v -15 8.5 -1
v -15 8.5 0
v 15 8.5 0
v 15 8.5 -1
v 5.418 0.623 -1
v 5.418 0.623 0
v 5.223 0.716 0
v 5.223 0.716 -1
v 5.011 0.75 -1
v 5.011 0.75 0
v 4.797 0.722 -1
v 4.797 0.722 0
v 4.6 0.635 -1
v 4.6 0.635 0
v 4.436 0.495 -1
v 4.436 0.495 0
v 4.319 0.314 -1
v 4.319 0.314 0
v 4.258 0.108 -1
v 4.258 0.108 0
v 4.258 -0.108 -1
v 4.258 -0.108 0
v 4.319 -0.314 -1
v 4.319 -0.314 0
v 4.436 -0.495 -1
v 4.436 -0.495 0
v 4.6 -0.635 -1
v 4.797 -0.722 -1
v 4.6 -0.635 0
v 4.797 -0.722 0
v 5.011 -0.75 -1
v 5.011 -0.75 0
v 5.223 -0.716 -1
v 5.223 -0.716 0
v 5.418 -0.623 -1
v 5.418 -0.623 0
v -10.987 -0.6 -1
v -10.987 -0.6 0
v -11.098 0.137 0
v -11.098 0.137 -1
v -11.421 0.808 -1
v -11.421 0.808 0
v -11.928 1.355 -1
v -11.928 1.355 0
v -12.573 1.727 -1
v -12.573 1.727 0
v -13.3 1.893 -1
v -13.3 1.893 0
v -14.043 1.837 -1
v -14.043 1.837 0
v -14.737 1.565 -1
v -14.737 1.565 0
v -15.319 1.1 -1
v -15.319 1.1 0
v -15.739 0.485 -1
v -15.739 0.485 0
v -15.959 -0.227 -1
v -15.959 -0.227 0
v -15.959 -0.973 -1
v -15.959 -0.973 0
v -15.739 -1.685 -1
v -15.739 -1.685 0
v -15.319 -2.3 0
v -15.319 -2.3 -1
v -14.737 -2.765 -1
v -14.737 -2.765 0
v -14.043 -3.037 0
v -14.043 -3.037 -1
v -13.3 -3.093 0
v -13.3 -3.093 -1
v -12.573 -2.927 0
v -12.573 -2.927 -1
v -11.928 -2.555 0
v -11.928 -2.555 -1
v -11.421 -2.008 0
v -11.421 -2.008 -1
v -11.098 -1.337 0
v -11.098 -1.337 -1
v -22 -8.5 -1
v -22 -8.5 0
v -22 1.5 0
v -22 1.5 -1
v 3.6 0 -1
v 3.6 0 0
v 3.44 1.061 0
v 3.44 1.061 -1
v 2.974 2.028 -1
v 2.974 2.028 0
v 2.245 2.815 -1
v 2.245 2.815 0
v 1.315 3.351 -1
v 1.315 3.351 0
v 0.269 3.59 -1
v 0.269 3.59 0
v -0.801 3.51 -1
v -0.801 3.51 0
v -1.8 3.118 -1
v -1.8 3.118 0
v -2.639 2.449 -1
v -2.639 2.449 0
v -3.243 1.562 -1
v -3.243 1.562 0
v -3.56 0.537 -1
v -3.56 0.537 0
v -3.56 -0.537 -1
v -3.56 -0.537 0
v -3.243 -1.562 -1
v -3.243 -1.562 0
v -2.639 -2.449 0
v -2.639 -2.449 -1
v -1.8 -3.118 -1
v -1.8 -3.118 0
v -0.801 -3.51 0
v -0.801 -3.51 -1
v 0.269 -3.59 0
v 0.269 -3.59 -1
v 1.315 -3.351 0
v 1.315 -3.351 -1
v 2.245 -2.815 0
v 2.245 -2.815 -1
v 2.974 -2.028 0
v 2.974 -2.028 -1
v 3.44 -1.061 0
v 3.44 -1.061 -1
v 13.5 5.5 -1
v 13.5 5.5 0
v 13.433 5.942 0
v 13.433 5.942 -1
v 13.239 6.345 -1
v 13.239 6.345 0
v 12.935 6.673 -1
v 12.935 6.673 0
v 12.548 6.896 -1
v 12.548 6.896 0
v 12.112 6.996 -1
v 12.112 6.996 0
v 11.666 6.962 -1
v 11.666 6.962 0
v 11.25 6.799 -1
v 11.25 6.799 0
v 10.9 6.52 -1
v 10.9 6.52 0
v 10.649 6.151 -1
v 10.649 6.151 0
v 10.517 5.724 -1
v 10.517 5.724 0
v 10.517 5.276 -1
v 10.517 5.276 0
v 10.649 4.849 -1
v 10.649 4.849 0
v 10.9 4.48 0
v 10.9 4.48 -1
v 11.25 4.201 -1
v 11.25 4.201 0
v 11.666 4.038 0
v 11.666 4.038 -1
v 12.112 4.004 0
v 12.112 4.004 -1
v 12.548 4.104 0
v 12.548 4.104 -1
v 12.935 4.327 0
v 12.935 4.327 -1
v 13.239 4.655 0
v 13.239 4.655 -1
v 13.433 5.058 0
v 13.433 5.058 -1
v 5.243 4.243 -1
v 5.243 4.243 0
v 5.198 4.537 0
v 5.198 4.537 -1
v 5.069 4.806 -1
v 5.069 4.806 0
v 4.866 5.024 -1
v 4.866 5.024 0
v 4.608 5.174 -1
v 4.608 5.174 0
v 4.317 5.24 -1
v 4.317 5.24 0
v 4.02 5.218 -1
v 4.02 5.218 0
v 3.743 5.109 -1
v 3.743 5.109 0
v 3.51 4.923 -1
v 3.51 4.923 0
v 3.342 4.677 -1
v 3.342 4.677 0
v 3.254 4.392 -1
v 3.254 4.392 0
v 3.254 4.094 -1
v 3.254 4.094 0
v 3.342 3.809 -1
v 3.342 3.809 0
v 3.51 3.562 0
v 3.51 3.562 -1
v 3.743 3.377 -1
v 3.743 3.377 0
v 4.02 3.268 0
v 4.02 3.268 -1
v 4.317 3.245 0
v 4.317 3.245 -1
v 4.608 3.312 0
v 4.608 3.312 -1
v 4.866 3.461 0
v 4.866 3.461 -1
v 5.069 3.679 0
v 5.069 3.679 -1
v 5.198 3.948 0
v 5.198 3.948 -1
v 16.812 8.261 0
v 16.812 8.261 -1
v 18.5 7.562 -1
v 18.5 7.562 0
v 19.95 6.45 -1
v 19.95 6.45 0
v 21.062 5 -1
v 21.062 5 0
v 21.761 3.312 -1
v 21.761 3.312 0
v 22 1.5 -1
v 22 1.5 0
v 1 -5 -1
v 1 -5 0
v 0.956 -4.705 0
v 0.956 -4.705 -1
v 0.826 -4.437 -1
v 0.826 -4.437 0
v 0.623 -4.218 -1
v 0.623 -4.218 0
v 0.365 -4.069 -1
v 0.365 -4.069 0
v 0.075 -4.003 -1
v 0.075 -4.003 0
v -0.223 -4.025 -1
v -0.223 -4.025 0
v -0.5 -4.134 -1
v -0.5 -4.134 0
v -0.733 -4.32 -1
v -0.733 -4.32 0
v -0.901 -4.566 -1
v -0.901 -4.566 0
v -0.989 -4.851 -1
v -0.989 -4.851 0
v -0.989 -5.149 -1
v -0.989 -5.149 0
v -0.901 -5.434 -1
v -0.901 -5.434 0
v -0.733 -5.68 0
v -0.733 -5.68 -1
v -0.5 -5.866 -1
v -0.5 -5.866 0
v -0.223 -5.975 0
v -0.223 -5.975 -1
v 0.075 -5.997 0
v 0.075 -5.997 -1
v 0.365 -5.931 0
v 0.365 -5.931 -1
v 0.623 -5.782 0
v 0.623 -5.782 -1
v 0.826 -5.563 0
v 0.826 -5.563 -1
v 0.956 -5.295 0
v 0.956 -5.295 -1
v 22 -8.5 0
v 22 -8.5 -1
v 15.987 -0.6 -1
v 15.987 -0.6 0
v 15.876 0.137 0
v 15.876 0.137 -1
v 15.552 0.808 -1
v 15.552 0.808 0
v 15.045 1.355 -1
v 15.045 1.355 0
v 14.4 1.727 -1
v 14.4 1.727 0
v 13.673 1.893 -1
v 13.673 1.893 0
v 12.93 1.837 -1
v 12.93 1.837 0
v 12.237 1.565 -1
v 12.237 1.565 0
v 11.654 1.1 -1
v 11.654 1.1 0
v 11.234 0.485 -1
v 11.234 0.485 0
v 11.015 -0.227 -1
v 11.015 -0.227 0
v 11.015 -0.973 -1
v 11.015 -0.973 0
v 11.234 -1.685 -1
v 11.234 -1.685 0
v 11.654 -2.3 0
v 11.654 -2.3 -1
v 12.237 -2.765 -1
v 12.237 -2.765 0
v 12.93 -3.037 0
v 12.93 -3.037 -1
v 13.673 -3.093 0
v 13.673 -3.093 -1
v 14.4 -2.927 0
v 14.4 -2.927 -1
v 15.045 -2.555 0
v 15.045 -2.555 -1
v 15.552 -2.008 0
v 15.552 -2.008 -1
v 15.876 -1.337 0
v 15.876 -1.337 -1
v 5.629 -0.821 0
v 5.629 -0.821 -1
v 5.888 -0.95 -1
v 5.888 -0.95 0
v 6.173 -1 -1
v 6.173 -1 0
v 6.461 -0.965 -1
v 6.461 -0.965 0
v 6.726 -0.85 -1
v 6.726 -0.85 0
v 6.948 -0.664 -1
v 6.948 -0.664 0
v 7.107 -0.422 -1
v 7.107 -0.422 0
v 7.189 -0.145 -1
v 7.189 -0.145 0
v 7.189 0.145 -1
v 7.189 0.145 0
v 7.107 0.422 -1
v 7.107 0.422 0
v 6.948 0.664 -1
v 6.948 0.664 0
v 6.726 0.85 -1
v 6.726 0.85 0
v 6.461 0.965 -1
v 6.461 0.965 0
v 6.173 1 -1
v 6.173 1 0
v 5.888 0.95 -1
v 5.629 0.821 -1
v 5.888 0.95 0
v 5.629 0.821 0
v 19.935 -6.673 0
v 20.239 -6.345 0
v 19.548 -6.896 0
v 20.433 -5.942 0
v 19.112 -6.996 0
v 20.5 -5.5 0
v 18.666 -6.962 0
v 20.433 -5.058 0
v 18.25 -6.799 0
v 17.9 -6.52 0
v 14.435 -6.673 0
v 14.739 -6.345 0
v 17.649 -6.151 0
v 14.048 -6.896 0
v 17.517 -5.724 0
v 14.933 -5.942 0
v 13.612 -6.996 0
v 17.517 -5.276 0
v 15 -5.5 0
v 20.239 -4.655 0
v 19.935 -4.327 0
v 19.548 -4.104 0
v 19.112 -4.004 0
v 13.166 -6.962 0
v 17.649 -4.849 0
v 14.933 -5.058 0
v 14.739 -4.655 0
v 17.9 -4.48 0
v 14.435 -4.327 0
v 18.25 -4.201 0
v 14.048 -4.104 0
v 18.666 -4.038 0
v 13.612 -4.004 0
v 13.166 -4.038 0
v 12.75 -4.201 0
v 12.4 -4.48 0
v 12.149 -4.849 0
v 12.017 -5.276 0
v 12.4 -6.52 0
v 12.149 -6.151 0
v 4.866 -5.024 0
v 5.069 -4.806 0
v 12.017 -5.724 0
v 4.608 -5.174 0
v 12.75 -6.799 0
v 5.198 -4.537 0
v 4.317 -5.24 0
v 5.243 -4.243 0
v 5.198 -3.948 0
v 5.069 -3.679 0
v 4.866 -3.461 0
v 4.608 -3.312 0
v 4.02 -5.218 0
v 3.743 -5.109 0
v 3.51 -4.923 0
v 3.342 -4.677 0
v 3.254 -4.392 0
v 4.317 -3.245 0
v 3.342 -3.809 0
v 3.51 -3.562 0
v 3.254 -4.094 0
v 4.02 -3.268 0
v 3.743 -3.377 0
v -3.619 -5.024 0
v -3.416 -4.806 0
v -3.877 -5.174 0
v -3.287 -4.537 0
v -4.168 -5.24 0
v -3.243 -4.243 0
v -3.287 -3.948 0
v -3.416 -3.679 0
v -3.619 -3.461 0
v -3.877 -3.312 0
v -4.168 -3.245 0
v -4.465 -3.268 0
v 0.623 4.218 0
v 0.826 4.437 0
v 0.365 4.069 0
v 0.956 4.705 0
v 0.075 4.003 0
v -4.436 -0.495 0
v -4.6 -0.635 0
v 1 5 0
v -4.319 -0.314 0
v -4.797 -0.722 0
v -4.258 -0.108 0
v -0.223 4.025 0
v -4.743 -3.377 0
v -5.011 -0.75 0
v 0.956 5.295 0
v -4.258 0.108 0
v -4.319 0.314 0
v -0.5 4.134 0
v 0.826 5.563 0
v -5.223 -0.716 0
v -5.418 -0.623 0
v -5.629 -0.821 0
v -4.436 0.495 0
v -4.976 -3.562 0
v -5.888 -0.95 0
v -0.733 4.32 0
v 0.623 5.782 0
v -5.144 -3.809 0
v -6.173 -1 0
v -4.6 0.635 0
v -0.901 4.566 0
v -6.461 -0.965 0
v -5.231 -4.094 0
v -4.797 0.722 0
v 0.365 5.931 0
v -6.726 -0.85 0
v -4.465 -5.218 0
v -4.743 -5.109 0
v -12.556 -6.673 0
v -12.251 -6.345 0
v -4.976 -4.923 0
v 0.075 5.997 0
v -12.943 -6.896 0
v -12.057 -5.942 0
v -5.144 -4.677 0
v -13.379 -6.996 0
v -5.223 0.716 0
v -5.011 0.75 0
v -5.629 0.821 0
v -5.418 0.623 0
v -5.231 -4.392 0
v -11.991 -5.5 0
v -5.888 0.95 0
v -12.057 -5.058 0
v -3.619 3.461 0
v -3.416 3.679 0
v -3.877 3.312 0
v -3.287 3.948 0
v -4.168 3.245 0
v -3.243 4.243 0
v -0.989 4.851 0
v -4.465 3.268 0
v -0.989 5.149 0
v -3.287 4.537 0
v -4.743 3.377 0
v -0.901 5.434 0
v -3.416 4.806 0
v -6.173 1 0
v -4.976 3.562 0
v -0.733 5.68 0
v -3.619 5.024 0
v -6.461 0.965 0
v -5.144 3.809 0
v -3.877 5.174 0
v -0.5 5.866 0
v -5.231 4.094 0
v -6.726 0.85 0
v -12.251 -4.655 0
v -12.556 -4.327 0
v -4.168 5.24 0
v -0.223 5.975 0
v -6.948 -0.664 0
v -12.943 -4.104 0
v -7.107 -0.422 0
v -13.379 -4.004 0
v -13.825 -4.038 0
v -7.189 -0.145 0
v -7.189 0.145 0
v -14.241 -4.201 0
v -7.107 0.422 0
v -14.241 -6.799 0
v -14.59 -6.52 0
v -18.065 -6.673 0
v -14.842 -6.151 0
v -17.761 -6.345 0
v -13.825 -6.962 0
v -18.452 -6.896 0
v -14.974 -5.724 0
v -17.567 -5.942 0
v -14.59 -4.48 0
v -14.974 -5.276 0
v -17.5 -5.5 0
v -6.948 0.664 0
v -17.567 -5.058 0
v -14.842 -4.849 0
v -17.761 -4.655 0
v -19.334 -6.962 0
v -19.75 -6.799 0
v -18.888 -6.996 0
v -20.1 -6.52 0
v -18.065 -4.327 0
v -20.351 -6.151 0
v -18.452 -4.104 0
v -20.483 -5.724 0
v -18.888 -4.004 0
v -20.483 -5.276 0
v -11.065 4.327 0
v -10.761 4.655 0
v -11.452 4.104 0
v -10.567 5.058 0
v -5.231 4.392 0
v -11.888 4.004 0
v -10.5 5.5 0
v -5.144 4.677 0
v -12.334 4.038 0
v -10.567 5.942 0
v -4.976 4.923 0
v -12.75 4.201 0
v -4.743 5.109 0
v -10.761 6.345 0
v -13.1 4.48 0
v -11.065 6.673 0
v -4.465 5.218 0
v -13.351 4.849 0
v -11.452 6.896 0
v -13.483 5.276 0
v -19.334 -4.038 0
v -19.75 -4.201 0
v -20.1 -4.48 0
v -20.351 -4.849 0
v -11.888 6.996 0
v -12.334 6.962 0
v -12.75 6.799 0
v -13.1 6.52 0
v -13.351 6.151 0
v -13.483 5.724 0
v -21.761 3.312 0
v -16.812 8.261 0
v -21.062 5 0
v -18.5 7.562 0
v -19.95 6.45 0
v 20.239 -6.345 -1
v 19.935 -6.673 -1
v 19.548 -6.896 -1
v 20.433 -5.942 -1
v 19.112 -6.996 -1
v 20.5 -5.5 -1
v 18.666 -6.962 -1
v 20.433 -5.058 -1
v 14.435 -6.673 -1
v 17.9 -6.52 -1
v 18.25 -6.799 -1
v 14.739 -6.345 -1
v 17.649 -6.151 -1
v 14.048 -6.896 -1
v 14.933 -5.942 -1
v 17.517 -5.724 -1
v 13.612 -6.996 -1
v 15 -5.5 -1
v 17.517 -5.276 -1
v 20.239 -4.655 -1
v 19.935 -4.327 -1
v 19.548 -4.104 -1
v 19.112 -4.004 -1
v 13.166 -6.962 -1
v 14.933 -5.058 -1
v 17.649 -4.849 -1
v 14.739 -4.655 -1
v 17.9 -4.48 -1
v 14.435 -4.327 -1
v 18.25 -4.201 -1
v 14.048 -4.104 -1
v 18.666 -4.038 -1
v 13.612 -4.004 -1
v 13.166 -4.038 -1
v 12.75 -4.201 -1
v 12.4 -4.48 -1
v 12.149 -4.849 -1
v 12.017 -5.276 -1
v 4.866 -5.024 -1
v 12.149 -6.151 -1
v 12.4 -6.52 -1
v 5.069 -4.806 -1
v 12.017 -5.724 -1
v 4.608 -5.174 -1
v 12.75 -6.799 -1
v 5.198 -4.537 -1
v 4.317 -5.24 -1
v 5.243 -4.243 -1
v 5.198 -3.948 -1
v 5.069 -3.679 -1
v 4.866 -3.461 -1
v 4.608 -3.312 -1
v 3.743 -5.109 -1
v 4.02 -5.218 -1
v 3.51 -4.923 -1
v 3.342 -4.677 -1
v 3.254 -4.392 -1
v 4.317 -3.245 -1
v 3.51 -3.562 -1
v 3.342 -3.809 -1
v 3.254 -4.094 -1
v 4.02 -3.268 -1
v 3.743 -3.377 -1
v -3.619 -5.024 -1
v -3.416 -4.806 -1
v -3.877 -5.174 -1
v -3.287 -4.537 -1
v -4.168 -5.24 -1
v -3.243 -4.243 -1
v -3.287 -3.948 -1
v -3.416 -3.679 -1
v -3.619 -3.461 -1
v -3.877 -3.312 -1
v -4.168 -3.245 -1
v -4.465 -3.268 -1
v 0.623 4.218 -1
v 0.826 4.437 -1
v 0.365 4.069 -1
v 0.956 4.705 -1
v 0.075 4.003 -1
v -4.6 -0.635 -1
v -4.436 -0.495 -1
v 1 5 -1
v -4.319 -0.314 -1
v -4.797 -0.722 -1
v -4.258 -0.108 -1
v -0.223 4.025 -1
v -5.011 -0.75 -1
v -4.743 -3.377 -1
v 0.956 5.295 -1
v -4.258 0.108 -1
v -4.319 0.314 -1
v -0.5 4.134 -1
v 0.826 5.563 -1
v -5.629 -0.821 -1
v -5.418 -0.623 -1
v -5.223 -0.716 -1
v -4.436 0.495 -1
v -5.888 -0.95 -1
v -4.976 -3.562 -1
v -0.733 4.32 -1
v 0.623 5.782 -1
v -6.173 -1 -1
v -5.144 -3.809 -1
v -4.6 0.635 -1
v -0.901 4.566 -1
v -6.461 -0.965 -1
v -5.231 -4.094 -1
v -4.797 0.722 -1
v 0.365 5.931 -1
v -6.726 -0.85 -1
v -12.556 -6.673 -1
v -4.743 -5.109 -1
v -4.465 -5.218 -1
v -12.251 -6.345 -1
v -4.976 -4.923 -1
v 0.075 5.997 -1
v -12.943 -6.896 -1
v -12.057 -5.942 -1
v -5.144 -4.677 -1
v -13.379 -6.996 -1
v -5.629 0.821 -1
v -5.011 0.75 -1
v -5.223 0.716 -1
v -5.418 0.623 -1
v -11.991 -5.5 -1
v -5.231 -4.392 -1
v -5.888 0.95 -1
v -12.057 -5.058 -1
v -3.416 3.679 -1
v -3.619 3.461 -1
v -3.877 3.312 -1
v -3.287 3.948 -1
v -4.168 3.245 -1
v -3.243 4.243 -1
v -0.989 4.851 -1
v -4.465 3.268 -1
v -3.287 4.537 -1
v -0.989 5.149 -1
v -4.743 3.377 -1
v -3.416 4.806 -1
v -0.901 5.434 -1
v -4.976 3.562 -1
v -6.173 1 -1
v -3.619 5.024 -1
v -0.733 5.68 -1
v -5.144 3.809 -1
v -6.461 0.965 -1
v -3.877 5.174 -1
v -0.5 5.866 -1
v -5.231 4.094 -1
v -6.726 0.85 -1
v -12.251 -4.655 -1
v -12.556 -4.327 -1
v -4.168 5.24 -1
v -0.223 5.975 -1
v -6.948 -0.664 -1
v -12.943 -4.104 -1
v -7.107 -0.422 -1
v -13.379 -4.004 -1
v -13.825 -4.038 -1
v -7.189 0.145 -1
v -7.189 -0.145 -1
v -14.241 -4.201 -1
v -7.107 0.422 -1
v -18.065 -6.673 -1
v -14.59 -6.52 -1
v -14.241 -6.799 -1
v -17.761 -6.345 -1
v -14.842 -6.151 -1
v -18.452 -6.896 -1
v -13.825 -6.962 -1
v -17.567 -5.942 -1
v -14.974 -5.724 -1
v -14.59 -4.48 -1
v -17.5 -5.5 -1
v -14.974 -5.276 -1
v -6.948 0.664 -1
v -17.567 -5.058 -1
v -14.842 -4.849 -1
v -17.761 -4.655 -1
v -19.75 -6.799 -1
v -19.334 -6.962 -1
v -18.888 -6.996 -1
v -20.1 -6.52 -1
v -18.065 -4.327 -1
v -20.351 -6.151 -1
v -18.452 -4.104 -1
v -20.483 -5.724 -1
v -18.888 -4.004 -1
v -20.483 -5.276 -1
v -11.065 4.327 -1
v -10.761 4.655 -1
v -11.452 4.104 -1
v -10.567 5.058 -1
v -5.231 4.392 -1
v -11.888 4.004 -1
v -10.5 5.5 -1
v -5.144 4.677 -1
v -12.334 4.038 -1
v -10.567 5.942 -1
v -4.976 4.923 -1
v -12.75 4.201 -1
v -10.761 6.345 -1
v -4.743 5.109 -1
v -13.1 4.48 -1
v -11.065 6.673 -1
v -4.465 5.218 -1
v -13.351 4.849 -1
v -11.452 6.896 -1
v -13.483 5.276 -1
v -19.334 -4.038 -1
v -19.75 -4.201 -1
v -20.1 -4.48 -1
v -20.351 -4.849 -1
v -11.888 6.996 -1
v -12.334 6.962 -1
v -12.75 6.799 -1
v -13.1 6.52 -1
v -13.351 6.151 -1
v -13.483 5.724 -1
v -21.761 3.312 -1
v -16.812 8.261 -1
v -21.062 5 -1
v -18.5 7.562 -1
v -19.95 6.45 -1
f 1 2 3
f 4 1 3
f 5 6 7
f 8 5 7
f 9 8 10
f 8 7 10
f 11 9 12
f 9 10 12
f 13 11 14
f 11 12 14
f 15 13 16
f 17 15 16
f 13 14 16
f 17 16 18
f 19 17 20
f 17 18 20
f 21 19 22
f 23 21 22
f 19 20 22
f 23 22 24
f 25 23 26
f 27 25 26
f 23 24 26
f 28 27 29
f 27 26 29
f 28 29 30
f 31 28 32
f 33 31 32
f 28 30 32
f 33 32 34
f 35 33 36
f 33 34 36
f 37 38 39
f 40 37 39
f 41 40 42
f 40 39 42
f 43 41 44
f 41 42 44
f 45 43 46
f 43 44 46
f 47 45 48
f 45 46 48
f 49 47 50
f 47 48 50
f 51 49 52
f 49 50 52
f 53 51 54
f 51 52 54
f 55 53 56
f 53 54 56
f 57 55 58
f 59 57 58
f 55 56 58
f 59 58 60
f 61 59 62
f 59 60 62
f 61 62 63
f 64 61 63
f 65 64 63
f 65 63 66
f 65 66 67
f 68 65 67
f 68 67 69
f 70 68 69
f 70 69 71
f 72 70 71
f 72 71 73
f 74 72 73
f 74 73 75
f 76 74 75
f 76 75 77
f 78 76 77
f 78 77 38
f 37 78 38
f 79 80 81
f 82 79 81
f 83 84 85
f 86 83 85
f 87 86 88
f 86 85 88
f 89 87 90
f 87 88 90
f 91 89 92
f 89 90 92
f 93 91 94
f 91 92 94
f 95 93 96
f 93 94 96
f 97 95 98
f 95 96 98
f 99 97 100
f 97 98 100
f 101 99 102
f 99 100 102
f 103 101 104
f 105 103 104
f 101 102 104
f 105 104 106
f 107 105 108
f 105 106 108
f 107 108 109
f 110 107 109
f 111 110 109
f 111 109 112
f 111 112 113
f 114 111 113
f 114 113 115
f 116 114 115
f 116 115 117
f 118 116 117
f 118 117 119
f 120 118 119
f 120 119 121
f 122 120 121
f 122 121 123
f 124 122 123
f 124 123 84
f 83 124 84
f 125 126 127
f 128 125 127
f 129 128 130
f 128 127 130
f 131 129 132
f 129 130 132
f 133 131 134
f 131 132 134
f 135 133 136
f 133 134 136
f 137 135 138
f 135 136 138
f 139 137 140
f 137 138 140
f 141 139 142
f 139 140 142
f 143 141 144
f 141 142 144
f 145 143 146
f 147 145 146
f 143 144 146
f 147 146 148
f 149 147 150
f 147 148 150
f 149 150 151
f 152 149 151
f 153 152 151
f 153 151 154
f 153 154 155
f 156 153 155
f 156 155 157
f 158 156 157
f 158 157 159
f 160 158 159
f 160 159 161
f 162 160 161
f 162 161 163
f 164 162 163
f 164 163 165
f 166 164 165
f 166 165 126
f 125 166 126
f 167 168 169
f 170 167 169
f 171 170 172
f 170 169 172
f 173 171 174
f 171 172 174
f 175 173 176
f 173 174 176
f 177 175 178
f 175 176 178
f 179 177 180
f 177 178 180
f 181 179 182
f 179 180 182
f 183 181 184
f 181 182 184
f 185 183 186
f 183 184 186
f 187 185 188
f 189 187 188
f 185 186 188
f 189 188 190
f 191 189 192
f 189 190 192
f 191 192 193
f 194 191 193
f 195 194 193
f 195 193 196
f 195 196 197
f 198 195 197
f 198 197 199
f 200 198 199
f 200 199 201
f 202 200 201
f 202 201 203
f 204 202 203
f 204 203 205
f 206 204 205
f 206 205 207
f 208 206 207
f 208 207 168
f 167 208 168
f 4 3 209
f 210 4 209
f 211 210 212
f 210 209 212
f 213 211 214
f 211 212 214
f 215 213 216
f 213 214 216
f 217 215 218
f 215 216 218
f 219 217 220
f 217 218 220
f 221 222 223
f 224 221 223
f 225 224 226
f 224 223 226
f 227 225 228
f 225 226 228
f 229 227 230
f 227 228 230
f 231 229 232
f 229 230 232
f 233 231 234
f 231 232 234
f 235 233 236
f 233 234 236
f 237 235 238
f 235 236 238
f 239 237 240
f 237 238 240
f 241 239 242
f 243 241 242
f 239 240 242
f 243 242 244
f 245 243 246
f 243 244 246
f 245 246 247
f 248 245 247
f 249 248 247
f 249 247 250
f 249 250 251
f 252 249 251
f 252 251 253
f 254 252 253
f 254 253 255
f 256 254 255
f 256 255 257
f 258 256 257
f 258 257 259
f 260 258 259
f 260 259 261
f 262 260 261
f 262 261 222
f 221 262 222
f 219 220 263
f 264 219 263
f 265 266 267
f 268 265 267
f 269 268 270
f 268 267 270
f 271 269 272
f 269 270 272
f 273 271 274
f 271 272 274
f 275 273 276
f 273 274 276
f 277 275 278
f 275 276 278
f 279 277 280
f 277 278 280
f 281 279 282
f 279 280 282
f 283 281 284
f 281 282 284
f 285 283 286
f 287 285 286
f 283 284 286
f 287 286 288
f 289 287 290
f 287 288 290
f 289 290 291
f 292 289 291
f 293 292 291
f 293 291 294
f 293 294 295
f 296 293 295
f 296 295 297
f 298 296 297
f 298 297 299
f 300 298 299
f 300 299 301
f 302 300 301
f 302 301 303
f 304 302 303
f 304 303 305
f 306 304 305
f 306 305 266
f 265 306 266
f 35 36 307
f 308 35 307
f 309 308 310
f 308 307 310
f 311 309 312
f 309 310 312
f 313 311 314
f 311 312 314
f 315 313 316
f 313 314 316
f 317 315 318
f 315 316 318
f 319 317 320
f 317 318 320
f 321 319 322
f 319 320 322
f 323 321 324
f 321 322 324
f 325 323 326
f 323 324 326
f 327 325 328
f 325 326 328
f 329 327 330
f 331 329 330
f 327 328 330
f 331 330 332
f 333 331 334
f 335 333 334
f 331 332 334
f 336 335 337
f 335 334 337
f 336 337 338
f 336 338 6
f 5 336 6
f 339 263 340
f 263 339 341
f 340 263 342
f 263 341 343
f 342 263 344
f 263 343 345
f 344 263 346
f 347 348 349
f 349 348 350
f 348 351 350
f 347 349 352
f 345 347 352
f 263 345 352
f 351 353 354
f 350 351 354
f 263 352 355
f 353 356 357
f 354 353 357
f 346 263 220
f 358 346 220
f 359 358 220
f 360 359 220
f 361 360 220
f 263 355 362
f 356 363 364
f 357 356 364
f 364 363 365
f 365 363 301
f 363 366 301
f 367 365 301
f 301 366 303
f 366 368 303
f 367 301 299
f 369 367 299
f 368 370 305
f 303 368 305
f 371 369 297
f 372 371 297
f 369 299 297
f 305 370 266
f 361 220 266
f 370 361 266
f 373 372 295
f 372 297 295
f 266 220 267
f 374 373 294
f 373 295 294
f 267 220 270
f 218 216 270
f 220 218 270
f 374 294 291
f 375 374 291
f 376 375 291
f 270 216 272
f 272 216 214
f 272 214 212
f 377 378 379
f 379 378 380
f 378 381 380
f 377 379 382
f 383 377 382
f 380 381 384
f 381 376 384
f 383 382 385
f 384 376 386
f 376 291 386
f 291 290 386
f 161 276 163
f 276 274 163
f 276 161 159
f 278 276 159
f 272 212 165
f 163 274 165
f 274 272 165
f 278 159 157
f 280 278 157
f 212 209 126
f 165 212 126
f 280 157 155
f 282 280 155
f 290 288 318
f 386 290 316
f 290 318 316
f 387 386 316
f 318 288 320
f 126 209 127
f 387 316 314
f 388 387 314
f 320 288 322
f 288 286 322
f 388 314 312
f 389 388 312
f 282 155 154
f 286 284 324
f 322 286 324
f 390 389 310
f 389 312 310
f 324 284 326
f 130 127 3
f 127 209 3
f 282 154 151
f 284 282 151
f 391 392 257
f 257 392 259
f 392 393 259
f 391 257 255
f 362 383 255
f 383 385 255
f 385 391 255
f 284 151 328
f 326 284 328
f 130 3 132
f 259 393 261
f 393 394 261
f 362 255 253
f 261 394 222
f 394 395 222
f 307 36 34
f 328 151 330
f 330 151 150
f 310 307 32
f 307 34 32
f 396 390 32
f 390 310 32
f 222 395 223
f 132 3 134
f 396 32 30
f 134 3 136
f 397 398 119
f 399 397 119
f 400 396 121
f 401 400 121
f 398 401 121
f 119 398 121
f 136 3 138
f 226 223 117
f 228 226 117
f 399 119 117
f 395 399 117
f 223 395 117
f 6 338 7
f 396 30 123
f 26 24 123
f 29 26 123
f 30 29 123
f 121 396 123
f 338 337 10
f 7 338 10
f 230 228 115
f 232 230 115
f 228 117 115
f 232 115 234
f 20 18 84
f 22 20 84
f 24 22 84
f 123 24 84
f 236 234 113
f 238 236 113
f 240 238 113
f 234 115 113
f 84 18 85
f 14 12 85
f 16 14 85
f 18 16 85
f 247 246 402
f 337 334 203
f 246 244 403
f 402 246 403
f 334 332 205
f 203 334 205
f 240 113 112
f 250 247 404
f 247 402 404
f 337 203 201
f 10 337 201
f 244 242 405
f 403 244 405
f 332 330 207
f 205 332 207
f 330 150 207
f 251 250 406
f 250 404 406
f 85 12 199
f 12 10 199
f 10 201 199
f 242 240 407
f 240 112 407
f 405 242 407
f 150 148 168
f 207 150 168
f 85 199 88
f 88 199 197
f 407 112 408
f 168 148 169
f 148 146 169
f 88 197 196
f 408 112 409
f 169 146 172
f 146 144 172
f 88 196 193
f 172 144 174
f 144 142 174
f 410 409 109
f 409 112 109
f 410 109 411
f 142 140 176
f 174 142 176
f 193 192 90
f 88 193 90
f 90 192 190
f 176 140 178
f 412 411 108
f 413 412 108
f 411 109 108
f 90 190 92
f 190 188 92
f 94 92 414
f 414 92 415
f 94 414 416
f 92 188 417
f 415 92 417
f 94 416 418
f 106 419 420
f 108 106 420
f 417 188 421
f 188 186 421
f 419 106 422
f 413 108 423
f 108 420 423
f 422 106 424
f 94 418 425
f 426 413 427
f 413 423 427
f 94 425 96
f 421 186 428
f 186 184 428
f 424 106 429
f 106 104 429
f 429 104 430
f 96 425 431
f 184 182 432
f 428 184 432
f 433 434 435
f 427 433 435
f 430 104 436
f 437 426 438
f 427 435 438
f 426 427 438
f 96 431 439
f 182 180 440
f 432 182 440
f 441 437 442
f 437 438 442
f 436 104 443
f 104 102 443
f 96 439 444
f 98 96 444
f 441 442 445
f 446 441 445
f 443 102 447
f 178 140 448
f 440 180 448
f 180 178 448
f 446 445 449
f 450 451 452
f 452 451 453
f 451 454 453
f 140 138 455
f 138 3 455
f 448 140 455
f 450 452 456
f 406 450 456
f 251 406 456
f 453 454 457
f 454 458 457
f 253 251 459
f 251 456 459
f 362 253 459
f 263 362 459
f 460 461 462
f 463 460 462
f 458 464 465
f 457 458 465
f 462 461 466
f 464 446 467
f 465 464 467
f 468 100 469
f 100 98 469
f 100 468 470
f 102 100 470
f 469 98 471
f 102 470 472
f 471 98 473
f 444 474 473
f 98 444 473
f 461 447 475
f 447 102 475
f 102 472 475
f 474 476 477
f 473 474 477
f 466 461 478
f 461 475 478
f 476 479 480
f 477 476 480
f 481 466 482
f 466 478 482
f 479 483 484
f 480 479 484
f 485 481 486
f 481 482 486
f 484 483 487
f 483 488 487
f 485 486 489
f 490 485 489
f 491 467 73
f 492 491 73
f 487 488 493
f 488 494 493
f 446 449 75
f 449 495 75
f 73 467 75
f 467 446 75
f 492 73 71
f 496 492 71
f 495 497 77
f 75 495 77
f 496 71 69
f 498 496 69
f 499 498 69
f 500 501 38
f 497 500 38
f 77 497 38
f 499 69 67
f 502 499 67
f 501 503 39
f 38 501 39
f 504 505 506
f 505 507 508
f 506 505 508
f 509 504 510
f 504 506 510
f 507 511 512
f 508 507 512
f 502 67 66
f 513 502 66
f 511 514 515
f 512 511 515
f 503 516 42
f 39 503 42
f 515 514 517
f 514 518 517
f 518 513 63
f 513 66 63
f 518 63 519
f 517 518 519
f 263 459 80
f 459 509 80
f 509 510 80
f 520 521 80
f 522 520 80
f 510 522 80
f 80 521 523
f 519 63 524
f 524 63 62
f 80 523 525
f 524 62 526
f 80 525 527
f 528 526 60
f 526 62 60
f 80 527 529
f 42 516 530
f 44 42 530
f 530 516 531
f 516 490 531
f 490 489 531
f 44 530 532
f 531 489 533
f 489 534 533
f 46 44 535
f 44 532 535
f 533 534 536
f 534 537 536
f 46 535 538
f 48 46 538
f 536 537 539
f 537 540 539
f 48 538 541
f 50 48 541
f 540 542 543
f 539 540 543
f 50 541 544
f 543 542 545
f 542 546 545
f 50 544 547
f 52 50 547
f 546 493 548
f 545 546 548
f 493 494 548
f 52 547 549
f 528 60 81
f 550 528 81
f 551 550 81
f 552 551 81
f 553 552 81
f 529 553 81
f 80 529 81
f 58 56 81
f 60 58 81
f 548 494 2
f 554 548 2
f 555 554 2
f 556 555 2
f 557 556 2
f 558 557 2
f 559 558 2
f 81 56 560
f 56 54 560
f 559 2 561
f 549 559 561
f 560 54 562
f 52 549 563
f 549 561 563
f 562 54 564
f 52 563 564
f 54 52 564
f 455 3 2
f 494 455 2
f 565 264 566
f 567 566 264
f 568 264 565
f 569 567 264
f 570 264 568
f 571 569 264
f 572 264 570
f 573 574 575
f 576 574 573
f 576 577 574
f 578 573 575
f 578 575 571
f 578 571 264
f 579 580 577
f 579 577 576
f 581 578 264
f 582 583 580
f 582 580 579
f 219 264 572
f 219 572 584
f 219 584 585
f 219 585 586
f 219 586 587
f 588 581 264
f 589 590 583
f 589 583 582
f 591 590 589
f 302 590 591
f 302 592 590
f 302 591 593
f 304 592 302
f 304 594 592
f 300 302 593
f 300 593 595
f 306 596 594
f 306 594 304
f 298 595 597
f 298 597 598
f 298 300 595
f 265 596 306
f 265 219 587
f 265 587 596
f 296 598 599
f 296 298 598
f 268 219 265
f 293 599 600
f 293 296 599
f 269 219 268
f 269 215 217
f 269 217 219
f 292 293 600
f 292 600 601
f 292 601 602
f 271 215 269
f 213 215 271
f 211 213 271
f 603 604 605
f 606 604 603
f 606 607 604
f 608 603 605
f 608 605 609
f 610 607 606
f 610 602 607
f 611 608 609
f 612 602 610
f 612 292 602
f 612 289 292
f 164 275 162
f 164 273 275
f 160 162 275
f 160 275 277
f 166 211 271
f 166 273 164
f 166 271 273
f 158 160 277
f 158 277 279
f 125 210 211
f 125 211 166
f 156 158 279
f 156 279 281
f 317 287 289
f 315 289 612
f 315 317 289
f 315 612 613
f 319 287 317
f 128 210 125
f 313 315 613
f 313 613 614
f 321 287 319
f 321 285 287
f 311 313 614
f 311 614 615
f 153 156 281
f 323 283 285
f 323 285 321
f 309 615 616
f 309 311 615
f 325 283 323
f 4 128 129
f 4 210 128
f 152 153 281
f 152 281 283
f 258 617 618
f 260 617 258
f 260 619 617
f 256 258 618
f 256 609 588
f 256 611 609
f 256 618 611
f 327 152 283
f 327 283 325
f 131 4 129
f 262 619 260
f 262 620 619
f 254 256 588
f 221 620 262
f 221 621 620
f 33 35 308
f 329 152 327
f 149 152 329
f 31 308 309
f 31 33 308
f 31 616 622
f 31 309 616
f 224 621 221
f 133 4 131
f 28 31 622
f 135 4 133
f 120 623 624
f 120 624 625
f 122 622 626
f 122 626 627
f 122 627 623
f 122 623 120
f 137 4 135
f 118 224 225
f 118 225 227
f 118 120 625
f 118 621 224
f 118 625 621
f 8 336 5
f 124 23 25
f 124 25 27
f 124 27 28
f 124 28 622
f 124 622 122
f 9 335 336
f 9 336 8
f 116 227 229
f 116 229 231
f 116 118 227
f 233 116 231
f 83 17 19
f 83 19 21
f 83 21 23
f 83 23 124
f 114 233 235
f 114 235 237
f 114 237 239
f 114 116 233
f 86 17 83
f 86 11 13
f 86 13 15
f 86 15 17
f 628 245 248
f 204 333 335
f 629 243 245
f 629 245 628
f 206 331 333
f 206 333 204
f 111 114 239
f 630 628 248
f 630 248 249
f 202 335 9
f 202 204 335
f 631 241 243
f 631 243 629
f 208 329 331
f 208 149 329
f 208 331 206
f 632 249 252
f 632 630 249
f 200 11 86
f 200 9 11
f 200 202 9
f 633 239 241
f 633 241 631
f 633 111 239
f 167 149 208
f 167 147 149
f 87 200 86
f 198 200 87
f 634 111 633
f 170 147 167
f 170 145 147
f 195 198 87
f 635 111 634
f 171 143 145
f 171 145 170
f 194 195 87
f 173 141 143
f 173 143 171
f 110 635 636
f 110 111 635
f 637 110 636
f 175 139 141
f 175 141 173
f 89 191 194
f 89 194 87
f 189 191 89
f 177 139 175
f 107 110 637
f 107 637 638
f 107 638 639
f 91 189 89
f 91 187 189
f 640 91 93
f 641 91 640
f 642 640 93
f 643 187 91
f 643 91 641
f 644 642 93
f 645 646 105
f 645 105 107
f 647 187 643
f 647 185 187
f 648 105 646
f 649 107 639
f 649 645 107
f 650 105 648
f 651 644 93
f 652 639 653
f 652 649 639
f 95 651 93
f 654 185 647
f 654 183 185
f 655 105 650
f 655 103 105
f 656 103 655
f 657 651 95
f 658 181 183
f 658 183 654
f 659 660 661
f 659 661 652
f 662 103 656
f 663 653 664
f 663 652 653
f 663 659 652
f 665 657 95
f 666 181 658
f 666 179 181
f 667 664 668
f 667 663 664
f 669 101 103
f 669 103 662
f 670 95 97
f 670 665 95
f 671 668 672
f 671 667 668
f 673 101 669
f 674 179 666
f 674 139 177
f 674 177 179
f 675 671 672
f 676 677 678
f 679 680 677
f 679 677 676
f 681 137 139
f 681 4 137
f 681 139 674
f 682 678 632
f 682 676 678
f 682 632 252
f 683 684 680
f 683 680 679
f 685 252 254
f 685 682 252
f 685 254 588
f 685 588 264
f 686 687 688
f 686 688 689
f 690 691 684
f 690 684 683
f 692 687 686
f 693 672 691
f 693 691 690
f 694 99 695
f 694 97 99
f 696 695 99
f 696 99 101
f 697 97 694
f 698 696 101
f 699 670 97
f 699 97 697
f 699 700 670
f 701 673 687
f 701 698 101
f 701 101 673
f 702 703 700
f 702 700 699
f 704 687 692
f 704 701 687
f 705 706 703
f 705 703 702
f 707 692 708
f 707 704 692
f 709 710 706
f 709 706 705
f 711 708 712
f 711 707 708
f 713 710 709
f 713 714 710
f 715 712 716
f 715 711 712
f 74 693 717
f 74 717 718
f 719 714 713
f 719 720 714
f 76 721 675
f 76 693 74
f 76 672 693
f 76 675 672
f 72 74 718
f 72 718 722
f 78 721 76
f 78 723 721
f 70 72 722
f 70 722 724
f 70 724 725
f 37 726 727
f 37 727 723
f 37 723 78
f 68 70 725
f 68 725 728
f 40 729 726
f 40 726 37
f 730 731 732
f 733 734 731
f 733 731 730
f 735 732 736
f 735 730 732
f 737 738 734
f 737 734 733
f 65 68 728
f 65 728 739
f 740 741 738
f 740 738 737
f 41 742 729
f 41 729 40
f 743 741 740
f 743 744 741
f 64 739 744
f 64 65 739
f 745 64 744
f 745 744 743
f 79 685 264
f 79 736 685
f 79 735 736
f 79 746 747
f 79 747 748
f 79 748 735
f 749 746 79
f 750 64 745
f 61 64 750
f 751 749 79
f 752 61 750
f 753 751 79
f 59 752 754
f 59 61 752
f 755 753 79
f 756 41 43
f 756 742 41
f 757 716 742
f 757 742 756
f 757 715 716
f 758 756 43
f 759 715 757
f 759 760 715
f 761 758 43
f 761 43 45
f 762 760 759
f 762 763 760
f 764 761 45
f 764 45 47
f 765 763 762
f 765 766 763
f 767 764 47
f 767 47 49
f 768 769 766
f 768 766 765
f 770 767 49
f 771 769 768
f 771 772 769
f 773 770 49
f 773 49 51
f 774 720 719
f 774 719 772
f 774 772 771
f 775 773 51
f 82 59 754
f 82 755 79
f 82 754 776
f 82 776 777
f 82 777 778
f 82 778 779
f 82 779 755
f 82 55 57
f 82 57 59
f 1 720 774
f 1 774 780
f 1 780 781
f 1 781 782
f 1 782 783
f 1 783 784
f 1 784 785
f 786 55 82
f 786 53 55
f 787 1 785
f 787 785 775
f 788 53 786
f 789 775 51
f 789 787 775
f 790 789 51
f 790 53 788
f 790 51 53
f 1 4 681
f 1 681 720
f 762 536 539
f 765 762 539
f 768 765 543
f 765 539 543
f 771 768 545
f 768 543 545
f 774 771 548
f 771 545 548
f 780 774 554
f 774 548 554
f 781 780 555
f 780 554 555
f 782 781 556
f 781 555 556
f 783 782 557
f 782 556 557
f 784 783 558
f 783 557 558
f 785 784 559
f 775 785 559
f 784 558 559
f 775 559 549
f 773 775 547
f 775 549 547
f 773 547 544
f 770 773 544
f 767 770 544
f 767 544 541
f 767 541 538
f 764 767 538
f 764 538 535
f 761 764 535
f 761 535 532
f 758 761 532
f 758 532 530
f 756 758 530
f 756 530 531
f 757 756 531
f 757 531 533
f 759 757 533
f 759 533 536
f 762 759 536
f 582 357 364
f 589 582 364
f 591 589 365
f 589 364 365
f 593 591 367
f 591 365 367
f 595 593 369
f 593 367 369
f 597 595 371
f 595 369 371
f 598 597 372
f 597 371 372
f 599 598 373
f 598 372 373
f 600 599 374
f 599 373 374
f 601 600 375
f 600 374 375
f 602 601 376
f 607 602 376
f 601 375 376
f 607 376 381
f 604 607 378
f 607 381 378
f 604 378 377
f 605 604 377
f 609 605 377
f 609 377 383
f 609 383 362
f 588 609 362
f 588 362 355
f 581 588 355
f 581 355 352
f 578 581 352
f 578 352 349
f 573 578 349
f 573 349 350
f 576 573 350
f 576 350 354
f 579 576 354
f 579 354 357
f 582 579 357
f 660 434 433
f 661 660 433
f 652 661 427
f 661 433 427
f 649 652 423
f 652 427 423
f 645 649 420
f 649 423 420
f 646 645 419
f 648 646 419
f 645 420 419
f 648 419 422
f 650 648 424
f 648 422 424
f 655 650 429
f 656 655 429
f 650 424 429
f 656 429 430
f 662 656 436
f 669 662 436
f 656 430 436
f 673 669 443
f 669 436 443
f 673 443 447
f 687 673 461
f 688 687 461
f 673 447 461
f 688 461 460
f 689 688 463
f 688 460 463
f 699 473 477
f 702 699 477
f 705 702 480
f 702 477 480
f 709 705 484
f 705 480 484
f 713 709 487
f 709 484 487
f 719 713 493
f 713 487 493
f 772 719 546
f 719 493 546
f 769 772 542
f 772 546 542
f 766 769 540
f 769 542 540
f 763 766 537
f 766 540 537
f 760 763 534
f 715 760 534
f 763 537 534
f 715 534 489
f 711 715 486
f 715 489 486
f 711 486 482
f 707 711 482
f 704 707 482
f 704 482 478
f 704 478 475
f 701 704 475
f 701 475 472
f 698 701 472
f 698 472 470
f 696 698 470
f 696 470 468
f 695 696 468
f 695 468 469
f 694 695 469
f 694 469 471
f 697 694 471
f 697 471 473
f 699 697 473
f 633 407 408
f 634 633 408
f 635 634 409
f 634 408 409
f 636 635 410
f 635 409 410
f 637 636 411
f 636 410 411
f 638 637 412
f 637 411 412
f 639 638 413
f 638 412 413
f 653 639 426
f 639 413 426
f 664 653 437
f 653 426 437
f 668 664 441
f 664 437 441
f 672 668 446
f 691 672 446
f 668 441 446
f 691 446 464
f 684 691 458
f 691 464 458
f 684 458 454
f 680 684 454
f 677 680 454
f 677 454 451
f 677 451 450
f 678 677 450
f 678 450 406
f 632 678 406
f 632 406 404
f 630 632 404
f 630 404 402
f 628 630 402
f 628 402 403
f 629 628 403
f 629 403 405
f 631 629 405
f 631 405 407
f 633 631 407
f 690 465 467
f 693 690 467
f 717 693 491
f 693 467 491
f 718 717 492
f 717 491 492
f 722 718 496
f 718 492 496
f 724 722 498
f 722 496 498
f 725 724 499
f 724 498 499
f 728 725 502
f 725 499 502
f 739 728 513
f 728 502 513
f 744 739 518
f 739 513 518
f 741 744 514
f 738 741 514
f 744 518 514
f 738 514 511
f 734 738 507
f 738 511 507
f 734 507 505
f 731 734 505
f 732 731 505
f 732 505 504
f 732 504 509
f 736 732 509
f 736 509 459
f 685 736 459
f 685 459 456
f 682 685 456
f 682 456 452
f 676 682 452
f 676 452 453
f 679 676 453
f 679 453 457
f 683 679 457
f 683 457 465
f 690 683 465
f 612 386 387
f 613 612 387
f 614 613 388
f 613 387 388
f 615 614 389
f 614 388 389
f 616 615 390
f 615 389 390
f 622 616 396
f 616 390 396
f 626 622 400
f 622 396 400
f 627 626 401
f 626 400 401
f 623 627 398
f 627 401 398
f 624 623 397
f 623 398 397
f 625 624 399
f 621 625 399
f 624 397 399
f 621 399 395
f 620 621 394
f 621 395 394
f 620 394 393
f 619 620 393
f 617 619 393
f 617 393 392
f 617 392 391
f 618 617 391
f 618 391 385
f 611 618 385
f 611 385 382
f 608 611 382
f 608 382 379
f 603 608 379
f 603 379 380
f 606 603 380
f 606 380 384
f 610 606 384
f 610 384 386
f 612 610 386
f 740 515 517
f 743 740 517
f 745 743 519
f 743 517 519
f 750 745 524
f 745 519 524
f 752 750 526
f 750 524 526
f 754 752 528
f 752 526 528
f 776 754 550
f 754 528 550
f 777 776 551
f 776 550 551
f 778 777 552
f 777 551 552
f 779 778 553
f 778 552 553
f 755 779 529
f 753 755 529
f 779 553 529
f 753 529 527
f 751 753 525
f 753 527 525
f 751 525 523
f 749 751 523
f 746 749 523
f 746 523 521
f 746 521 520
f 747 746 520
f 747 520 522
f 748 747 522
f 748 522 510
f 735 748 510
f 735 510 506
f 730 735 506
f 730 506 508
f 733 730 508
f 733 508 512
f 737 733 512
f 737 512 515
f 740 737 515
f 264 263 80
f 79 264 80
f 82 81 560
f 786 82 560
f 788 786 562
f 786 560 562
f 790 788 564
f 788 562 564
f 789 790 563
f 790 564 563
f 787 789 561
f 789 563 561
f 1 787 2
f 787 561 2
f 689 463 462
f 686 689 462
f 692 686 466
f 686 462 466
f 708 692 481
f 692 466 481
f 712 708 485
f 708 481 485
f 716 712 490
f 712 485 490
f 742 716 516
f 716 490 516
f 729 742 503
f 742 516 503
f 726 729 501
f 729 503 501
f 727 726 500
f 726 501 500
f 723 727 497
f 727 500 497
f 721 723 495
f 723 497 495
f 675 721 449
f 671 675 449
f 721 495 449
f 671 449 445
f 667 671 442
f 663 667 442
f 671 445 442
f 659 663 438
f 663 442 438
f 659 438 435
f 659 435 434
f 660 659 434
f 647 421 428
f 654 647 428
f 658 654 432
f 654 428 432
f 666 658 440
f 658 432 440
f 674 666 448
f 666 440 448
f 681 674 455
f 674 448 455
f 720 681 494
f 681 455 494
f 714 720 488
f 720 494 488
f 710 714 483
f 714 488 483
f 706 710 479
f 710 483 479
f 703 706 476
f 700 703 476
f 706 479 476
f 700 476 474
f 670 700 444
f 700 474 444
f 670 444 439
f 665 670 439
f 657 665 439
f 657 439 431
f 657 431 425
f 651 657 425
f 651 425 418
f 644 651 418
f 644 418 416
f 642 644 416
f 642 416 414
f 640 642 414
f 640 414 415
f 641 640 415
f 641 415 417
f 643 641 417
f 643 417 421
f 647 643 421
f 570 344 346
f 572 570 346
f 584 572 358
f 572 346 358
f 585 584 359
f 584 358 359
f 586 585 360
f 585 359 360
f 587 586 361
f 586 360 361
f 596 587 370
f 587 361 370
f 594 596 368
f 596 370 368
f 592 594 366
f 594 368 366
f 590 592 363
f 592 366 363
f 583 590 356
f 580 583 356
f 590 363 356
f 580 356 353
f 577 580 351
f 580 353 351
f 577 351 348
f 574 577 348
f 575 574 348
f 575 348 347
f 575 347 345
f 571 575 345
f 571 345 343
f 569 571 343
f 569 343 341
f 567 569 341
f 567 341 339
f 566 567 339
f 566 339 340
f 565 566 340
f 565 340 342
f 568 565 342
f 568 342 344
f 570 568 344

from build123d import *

# Parameters (mm, degrees)
EXTRUDE_1_DEPTH     = 1
SKETCH_6_R          = 1
SKETCH_6_R_2        = 3.6
CUT_EXTRUDE_1_DEPTH = 2
SKETCH_8_R          = 2.5
CUT_EXTRUDE_2_DEPTH = 2
SKETCH_12_R         = 1.5
CUT_EXTRUDE_3_DEPTH = 10


with BuildPart() as part:
    # 草图10 → 凸台-拉伸1 (new body)
    with BuildSketch(Plane.XY):
        with BuildLine():
            Line((-15, 8.5), (15, 8.5))
            ThreePointArc((15, 8.5), (19.949747468, 6.449747468), (22, 1.5))
            Line((22, 1.5), (22, -8.5))
            Line((22, -8.5), (-22, -8.5))
            Line((-22, -8.5), (-22, 1.5))
            ThreePointArc((-22, 1.5), (-19.949747468, 6.449747468), (-15, 8.5))
        make_face()
    extrude(amount=-EXTRUDE_1_DEPTH)

    # 草图6 → 切除-拉伸1 (cut)
    with BuildSketch(Plane.XY):
        with Locations((0, 5)):
            Circle(SKETCH_6_R)
        with Locations((0, -5)):
            Circle(SKETCH_6_R)
        Circle(SKETCH_6_R_2)
        with Locations((-4.242640687, 4.242640687)):
            Circle(SKETCH_6_R)
        with Locations((4.242640687, 4.242640687)):
            Circle(SKETCH_6_R)
        with Locations((-4.242640687, -4.242640687)):
            Circle(SKETCH_6_R)
        with Locations((4.242640687, -4.242640687)):
            Circle(SKETCH_6_R)
        with BuildLine():
            ThreePointArc((-5.417708333, -0.622912312), (-4.25, 0), (-5.417708333, 0.622912312))
            ThreePointArc((-5.417708333, 0.622912312), (-7.2, 0), (-5.417708333, -0.622912312))
        make_face()
        with BuildLine():
            ThreePointArc((5.417708333, 0.622912312), (4.25, 0), (5.417708333, -0.622912312))
            ThreePointArc((5.417708333, -0.622912312), (7.2, 0), (5.417708333, 0.622912312))
        make_face()
    extrude(amount=-CUT_EXTRUDE_1_DEPTH, mode=Mode.SUBTRACT)

    # 草图8 → 切除-拉伸2 (cut)
    with BuildSketch(Plane.XY):
        with Locations((-13.486660076, -0.6)):
            Circle(SKETCH_8_R)
        with Locations((13.486660076, -0.6)):
            Circle(SKETCH_8_R)
    extrude(amount=-CUT_EXTRUDE_2_DEPTH, mode=Mode.SUBTRACT)

    # 草图12 → 切除-拉伸3 (cut)
    with BuildSketch(Plane.XY):
        with Locations((-19, -5.5)):
            Circle(SKETCH_12_R)
        with Locations((19, -5.5)):
            Circle(SKETCH_12_R)
        with Locations((-12, 5.5)):
            Circle(SKETCH_12_R)
        with Locations((12, 5.5)):
            Circle(SKETCH_12_R)
        with Locations((-13.490737563, -5.5)):
            Circle(SKETCH_12_R)
        with Locations((13.5, -5.5)):
            Circle(SKETCH_12_R)
    extrude(amount=-CUT_EXTRUDE_3_DEPTH, mode=Mode.SUBTRACT)


solid = part.part
